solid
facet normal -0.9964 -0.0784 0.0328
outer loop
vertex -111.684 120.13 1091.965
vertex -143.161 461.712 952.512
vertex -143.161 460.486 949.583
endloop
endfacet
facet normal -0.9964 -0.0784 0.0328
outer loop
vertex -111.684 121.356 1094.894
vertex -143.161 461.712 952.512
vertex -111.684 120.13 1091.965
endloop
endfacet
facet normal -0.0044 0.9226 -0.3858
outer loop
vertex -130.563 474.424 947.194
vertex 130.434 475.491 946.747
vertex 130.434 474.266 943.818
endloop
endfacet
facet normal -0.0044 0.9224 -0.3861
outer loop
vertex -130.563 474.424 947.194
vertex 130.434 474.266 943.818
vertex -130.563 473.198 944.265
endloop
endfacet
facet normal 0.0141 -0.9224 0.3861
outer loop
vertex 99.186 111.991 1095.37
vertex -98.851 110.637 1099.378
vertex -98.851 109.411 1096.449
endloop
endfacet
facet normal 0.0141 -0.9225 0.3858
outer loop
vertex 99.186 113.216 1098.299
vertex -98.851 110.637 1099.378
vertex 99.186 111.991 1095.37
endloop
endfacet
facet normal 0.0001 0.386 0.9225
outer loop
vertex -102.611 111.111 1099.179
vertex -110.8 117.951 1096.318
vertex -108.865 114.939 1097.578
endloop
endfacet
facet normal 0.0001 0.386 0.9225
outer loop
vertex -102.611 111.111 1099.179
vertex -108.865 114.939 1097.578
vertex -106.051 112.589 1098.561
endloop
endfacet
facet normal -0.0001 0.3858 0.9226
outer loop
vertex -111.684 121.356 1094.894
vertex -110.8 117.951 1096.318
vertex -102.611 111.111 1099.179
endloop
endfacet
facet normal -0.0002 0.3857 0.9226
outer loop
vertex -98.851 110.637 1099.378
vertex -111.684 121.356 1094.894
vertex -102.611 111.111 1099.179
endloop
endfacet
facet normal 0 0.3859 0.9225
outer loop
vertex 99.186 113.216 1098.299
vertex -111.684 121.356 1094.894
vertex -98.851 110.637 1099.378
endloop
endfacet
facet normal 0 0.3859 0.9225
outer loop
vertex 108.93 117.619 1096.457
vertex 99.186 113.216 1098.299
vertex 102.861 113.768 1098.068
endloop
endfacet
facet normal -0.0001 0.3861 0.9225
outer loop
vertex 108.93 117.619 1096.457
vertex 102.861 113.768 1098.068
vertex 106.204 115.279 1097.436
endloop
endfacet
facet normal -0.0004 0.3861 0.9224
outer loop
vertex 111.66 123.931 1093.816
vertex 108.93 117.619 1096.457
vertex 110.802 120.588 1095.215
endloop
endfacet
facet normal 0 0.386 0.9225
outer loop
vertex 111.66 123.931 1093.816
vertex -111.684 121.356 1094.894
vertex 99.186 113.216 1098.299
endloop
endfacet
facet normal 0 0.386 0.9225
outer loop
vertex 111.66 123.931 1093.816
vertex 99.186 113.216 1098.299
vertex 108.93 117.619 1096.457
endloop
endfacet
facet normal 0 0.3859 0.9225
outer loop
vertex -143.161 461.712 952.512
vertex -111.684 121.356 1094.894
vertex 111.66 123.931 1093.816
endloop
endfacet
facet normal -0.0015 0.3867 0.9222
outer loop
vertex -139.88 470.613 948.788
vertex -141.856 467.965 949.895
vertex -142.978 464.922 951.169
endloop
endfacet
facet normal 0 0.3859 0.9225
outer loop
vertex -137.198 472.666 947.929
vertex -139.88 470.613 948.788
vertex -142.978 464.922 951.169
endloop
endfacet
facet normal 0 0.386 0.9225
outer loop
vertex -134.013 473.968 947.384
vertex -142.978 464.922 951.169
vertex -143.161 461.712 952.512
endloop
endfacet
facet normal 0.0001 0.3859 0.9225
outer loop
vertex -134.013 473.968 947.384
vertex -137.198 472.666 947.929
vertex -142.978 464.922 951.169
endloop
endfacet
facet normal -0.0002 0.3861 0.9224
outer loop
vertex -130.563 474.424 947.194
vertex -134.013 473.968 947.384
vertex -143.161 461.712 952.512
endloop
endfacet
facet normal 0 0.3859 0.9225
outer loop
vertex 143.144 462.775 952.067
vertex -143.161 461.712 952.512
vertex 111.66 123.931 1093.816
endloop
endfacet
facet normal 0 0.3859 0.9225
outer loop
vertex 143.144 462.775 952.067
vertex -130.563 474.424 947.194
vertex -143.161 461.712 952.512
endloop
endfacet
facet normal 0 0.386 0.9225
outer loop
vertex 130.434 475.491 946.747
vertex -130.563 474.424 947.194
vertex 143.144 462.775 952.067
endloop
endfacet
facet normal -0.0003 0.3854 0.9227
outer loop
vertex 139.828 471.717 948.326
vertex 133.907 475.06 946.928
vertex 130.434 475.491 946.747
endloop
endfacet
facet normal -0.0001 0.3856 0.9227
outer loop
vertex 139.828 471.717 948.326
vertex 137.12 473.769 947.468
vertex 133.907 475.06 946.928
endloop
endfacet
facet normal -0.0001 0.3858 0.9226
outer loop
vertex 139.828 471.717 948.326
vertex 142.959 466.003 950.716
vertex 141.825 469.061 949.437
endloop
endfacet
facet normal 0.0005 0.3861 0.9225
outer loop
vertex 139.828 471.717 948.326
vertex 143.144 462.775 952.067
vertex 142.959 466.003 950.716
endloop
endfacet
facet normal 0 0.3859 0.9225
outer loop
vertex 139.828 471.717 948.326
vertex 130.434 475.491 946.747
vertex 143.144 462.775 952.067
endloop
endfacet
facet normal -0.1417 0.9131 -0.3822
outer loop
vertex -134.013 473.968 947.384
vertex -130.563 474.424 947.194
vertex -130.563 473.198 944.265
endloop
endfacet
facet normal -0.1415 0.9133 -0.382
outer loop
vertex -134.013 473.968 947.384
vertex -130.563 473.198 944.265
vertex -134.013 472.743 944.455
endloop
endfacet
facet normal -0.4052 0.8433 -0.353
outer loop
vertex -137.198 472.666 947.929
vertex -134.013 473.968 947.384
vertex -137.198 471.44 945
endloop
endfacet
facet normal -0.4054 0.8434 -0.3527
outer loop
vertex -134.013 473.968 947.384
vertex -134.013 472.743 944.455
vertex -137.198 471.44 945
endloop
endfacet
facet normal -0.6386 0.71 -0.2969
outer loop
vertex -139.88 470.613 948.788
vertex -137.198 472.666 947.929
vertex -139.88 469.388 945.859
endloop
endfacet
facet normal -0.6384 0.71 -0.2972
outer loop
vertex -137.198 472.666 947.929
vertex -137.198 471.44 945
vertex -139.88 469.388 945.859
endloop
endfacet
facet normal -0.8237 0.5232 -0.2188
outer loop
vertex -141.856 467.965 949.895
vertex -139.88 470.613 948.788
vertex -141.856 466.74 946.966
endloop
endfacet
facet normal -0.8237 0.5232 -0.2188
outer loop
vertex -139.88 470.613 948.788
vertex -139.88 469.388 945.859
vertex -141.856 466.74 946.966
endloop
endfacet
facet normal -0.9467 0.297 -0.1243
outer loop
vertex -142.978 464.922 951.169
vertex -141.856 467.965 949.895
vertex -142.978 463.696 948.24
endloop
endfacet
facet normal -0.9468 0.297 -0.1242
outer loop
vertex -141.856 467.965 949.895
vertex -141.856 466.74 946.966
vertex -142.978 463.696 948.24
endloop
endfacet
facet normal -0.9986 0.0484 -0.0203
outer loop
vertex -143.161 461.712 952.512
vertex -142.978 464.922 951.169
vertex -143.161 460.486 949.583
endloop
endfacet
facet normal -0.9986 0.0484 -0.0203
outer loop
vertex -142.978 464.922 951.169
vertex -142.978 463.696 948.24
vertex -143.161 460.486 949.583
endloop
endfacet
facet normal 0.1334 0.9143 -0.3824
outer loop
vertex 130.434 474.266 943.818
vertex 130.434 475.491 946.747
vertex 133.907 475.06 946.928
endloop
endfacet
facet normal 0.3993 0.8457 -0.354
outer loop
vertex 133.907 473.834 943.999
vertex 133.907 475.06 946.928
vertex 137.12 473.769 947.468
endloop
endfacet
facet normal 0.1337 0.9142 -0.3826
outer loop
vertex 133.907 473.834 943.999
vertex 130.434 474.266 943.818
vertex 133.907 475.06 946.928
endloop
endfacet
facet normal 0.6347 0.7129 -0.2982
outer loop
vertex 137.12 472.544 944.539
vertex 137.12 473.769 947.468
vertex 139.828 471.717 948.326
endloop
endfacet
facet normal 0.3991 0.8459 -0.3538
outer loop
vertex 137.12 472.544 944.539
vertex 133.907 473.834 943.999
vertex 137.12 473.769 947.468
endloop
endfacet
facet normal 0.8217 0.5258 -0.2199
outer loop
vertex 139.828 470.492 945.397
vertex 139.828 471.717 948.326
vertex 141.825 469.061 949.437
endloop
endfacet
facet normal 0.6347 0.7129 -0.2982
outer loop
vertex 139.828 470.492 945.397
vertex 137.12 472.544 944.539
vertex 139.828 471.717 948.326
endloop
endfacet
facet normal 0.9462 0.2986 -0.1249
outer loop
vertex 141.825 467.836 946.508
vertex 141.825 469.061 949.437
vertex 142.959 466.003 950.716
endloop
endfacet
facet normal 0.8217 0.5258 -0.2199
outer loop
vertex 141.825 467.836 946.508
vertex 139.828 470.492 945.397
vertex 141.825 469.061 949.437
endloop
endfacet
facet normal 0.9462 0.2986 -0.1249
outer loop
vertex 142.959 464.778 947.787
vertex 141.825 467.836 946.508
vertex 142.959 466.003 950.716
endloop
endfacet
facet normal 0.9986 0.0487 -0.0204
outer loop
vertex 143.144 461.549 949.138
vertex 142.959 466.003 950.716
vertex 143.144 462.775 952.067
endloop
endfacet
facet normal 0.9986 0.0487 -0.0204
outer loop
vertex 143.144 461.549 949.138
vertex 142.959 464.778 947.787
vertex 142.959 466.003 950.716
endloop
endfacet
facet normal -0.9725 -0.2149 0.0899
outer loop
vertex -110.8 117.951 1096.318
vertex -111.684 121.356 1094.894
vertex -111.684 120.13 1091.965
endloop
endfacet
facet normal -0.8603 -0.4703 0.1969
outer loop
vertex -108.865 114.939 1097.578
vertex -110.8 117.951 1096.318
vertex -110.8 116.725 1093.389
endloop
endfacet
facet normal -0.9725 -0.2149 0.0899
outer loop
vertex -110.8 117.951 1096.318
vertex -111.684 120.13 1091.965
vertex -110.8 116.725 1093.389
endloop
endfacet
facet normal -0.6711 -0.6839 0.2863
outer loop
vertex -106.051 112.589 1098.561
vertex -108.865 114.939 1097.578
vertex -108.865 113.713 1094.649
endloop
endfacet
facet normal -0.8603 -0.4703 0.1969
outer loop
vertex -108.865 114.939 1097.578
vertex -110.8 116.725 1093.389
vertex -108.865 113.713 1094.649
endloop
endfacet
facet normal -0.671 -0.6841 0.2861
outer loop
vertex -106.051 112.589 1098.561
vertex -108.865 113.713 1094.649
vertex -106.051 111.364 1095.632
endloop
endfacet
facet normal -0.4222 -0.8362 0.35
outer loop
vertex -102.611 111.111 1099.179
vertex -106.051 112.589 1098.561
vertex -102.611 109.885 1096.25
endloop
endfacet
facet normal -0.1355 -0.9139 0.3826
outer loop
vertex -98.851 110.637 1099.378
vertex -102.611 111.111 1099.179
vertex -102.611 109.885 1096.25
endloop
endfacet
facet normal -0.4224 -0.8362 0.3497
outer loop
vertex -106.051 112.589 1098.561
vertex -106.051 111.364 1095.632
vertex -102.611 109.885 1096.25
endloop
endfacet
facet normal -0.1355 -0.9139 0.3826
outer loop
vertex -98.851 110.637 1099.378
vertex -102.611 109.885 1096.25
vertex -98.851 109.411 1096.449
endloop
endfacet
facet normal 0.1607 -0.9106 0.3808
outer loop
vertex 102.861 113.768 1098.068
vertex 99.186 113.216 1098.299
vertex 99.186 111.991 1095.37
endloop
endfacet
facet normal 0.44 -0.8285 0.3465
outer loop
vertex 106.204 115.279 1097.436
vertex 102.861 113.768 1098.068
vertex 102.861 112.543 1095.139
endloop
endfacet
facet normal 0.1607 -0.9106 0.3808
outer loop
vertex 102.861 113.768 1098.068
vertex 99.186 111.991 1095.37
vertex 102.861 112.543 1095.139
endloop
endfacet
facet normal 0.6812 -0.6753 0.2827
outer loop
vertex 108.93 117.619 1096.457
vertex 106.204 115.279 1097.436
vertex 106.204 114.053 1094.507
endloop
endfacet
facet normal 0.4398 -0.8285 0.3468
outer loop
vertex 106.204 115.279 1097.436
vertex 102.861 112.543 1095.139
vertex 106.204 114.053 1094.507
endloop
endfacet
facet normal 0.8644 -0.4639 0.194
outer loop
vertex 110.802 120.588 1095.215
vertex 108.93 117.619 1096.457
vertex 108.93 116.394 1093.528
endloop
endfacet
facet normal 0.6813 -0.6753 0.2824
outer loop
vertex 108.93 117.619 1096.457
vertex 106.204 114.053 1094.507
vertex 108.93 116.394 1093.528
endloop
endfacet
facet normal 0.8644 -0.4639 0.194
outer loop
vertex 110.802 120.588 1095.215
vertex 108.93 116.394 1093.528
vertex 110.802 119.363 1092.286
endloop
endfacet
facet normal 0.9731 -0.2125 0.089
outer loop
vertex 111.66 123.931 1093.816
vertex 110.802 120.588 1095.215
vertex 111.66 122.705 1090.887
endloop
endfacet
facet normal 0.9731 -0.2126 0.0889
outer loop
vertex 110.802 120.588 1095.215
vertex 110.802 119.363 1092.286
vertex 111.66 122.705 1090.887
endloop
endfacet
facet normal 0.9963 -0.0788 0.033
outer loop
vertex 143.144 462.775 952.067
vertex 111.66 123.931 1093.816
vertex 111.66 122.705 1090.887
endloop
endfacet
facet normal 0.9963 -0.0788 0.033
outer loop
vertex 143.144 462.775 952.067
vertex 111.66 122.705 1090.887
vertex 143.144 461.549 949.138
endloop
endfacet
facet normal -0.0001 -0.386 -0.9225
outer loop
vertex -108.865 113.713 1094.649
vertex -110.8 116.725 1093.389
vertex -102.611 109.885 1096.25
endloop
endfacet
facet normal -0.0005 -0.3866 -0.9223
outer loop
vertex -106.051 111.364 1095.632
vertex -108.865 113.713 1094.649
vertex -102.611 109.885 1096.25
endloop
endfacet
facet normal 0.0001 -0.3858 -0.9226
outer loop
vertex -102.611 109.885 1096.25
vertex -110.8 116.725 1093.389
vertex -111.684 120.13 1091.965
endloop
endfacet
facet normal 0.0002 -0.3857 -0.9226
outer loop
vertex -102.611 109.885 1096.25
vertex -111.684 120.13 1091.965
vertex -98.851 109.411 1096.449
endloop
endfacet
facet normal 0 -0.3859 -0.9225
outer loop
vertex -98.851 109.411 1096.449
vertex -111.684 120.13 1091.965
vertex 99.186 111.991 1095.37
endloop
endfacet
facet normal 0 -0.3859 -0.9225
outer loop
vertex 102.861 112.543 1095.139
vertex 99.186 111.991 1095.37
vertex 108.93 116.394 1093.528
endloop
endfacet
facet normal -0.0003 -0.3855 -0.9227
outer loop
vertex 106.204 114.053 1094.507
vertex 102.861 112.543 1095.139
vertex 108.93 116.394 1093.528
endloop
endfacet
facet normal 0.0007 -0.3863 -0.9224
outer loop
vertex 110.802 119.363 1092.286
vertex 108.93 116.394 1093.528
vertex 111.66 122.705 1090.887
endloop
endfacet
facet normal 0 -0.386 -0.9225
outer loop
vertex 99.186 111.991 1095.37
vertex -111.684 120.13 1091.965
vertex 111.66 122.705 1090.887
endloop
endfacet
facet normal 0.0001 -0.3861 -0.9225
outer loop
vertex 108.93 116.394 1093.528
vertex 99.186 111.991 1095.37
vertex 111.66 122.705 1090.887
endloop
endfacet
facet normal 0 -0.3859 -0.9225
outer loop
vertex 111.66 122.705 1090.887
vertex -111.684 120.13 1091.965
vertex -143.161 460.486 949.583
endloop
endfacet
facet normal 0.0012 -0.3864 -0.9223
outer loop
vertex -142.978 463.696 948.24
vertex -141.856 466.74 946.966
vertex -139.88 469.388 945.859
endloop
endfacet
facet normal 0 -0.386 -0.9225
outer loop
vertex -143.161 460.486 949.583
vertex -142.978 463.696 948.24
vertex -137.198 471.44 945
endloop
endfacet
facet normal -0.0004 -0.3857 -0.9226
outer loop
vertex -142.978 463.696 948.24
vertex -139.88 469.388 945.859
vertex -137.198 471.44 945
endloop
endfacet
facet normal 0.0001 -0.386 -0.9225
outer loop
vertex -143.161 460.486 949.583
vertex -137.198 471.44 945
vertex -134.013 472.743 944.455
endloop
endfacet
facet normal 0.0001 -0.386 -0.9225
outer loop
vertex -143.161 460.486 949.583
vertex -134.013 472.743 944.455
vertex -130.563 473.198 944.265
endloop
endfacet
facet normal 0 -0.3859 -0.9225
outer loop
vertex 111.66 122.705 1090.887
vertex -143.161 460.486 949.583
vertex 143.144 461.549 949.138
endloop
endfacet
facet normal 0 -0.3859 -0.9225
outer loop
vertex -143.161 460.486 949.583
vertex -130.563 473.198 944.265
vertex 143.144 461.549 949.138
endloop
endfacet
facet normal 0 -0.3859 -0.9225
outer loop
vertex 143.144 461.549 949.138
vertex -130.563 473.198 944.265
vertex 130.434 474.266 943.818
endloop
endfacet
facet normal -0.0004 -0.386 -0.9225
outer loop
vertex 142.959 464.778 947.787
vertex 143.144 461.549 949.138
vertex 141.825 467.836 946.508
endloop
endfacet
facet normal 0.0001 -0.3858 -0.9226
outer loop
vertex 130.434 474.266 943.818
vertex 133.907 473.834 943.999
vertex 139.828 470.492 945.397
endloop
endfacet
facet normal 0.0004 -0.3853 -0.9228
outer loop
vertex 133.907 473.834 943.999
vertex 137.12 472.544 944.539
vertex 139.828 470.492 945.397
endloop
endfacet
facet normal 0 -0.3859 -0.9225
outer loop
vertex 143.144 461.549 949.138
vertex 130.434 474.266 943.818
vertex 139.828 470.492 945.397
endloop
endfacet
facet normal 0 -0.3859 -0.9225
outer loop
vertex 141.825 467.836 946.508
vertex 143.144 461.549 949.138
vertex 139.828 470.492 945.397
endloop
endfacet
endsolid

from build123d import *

# Parameters (mm, degrees)
BOSS_EXTRUDE1_DEPTH = 3.175
FILLET1_R           = 12.7


with BuildPart() as part:
    # Sketch1 → Boss-Extrude1 (new body)
    with BuildSketch(Plane(origin=(0, 407.886507076, 975.028347662), x_dir=(1, 0, 0), z_dir=(0, 0.38592481598359657, 0.922530236040005))):
        Polygon((144.331189968, 73.343707369), (-144.331189968, 72.063414553), (-110.678400742, -322.378637797), (110.678400742, -319.252822954), align=None)
    extrude(amount=-BOSS_EXTRUDE1_DEPTH)

    # Fillet1
    fillet1_edges = [part.edges().sort_by_distance(p)[0] for p in [
        (110.678400742, 112.753469314, 1096.771417863),
        (-110.678400742, 109.86981061, 1097.977747381),
        (-144.331189968, 473.754530268, 945.752770911),
        (144.331189968, 474.935639101, 945.258674142),
    ]]
    fillet(fillet1_edges, radius=FILLET1_R)


solid = part.part
